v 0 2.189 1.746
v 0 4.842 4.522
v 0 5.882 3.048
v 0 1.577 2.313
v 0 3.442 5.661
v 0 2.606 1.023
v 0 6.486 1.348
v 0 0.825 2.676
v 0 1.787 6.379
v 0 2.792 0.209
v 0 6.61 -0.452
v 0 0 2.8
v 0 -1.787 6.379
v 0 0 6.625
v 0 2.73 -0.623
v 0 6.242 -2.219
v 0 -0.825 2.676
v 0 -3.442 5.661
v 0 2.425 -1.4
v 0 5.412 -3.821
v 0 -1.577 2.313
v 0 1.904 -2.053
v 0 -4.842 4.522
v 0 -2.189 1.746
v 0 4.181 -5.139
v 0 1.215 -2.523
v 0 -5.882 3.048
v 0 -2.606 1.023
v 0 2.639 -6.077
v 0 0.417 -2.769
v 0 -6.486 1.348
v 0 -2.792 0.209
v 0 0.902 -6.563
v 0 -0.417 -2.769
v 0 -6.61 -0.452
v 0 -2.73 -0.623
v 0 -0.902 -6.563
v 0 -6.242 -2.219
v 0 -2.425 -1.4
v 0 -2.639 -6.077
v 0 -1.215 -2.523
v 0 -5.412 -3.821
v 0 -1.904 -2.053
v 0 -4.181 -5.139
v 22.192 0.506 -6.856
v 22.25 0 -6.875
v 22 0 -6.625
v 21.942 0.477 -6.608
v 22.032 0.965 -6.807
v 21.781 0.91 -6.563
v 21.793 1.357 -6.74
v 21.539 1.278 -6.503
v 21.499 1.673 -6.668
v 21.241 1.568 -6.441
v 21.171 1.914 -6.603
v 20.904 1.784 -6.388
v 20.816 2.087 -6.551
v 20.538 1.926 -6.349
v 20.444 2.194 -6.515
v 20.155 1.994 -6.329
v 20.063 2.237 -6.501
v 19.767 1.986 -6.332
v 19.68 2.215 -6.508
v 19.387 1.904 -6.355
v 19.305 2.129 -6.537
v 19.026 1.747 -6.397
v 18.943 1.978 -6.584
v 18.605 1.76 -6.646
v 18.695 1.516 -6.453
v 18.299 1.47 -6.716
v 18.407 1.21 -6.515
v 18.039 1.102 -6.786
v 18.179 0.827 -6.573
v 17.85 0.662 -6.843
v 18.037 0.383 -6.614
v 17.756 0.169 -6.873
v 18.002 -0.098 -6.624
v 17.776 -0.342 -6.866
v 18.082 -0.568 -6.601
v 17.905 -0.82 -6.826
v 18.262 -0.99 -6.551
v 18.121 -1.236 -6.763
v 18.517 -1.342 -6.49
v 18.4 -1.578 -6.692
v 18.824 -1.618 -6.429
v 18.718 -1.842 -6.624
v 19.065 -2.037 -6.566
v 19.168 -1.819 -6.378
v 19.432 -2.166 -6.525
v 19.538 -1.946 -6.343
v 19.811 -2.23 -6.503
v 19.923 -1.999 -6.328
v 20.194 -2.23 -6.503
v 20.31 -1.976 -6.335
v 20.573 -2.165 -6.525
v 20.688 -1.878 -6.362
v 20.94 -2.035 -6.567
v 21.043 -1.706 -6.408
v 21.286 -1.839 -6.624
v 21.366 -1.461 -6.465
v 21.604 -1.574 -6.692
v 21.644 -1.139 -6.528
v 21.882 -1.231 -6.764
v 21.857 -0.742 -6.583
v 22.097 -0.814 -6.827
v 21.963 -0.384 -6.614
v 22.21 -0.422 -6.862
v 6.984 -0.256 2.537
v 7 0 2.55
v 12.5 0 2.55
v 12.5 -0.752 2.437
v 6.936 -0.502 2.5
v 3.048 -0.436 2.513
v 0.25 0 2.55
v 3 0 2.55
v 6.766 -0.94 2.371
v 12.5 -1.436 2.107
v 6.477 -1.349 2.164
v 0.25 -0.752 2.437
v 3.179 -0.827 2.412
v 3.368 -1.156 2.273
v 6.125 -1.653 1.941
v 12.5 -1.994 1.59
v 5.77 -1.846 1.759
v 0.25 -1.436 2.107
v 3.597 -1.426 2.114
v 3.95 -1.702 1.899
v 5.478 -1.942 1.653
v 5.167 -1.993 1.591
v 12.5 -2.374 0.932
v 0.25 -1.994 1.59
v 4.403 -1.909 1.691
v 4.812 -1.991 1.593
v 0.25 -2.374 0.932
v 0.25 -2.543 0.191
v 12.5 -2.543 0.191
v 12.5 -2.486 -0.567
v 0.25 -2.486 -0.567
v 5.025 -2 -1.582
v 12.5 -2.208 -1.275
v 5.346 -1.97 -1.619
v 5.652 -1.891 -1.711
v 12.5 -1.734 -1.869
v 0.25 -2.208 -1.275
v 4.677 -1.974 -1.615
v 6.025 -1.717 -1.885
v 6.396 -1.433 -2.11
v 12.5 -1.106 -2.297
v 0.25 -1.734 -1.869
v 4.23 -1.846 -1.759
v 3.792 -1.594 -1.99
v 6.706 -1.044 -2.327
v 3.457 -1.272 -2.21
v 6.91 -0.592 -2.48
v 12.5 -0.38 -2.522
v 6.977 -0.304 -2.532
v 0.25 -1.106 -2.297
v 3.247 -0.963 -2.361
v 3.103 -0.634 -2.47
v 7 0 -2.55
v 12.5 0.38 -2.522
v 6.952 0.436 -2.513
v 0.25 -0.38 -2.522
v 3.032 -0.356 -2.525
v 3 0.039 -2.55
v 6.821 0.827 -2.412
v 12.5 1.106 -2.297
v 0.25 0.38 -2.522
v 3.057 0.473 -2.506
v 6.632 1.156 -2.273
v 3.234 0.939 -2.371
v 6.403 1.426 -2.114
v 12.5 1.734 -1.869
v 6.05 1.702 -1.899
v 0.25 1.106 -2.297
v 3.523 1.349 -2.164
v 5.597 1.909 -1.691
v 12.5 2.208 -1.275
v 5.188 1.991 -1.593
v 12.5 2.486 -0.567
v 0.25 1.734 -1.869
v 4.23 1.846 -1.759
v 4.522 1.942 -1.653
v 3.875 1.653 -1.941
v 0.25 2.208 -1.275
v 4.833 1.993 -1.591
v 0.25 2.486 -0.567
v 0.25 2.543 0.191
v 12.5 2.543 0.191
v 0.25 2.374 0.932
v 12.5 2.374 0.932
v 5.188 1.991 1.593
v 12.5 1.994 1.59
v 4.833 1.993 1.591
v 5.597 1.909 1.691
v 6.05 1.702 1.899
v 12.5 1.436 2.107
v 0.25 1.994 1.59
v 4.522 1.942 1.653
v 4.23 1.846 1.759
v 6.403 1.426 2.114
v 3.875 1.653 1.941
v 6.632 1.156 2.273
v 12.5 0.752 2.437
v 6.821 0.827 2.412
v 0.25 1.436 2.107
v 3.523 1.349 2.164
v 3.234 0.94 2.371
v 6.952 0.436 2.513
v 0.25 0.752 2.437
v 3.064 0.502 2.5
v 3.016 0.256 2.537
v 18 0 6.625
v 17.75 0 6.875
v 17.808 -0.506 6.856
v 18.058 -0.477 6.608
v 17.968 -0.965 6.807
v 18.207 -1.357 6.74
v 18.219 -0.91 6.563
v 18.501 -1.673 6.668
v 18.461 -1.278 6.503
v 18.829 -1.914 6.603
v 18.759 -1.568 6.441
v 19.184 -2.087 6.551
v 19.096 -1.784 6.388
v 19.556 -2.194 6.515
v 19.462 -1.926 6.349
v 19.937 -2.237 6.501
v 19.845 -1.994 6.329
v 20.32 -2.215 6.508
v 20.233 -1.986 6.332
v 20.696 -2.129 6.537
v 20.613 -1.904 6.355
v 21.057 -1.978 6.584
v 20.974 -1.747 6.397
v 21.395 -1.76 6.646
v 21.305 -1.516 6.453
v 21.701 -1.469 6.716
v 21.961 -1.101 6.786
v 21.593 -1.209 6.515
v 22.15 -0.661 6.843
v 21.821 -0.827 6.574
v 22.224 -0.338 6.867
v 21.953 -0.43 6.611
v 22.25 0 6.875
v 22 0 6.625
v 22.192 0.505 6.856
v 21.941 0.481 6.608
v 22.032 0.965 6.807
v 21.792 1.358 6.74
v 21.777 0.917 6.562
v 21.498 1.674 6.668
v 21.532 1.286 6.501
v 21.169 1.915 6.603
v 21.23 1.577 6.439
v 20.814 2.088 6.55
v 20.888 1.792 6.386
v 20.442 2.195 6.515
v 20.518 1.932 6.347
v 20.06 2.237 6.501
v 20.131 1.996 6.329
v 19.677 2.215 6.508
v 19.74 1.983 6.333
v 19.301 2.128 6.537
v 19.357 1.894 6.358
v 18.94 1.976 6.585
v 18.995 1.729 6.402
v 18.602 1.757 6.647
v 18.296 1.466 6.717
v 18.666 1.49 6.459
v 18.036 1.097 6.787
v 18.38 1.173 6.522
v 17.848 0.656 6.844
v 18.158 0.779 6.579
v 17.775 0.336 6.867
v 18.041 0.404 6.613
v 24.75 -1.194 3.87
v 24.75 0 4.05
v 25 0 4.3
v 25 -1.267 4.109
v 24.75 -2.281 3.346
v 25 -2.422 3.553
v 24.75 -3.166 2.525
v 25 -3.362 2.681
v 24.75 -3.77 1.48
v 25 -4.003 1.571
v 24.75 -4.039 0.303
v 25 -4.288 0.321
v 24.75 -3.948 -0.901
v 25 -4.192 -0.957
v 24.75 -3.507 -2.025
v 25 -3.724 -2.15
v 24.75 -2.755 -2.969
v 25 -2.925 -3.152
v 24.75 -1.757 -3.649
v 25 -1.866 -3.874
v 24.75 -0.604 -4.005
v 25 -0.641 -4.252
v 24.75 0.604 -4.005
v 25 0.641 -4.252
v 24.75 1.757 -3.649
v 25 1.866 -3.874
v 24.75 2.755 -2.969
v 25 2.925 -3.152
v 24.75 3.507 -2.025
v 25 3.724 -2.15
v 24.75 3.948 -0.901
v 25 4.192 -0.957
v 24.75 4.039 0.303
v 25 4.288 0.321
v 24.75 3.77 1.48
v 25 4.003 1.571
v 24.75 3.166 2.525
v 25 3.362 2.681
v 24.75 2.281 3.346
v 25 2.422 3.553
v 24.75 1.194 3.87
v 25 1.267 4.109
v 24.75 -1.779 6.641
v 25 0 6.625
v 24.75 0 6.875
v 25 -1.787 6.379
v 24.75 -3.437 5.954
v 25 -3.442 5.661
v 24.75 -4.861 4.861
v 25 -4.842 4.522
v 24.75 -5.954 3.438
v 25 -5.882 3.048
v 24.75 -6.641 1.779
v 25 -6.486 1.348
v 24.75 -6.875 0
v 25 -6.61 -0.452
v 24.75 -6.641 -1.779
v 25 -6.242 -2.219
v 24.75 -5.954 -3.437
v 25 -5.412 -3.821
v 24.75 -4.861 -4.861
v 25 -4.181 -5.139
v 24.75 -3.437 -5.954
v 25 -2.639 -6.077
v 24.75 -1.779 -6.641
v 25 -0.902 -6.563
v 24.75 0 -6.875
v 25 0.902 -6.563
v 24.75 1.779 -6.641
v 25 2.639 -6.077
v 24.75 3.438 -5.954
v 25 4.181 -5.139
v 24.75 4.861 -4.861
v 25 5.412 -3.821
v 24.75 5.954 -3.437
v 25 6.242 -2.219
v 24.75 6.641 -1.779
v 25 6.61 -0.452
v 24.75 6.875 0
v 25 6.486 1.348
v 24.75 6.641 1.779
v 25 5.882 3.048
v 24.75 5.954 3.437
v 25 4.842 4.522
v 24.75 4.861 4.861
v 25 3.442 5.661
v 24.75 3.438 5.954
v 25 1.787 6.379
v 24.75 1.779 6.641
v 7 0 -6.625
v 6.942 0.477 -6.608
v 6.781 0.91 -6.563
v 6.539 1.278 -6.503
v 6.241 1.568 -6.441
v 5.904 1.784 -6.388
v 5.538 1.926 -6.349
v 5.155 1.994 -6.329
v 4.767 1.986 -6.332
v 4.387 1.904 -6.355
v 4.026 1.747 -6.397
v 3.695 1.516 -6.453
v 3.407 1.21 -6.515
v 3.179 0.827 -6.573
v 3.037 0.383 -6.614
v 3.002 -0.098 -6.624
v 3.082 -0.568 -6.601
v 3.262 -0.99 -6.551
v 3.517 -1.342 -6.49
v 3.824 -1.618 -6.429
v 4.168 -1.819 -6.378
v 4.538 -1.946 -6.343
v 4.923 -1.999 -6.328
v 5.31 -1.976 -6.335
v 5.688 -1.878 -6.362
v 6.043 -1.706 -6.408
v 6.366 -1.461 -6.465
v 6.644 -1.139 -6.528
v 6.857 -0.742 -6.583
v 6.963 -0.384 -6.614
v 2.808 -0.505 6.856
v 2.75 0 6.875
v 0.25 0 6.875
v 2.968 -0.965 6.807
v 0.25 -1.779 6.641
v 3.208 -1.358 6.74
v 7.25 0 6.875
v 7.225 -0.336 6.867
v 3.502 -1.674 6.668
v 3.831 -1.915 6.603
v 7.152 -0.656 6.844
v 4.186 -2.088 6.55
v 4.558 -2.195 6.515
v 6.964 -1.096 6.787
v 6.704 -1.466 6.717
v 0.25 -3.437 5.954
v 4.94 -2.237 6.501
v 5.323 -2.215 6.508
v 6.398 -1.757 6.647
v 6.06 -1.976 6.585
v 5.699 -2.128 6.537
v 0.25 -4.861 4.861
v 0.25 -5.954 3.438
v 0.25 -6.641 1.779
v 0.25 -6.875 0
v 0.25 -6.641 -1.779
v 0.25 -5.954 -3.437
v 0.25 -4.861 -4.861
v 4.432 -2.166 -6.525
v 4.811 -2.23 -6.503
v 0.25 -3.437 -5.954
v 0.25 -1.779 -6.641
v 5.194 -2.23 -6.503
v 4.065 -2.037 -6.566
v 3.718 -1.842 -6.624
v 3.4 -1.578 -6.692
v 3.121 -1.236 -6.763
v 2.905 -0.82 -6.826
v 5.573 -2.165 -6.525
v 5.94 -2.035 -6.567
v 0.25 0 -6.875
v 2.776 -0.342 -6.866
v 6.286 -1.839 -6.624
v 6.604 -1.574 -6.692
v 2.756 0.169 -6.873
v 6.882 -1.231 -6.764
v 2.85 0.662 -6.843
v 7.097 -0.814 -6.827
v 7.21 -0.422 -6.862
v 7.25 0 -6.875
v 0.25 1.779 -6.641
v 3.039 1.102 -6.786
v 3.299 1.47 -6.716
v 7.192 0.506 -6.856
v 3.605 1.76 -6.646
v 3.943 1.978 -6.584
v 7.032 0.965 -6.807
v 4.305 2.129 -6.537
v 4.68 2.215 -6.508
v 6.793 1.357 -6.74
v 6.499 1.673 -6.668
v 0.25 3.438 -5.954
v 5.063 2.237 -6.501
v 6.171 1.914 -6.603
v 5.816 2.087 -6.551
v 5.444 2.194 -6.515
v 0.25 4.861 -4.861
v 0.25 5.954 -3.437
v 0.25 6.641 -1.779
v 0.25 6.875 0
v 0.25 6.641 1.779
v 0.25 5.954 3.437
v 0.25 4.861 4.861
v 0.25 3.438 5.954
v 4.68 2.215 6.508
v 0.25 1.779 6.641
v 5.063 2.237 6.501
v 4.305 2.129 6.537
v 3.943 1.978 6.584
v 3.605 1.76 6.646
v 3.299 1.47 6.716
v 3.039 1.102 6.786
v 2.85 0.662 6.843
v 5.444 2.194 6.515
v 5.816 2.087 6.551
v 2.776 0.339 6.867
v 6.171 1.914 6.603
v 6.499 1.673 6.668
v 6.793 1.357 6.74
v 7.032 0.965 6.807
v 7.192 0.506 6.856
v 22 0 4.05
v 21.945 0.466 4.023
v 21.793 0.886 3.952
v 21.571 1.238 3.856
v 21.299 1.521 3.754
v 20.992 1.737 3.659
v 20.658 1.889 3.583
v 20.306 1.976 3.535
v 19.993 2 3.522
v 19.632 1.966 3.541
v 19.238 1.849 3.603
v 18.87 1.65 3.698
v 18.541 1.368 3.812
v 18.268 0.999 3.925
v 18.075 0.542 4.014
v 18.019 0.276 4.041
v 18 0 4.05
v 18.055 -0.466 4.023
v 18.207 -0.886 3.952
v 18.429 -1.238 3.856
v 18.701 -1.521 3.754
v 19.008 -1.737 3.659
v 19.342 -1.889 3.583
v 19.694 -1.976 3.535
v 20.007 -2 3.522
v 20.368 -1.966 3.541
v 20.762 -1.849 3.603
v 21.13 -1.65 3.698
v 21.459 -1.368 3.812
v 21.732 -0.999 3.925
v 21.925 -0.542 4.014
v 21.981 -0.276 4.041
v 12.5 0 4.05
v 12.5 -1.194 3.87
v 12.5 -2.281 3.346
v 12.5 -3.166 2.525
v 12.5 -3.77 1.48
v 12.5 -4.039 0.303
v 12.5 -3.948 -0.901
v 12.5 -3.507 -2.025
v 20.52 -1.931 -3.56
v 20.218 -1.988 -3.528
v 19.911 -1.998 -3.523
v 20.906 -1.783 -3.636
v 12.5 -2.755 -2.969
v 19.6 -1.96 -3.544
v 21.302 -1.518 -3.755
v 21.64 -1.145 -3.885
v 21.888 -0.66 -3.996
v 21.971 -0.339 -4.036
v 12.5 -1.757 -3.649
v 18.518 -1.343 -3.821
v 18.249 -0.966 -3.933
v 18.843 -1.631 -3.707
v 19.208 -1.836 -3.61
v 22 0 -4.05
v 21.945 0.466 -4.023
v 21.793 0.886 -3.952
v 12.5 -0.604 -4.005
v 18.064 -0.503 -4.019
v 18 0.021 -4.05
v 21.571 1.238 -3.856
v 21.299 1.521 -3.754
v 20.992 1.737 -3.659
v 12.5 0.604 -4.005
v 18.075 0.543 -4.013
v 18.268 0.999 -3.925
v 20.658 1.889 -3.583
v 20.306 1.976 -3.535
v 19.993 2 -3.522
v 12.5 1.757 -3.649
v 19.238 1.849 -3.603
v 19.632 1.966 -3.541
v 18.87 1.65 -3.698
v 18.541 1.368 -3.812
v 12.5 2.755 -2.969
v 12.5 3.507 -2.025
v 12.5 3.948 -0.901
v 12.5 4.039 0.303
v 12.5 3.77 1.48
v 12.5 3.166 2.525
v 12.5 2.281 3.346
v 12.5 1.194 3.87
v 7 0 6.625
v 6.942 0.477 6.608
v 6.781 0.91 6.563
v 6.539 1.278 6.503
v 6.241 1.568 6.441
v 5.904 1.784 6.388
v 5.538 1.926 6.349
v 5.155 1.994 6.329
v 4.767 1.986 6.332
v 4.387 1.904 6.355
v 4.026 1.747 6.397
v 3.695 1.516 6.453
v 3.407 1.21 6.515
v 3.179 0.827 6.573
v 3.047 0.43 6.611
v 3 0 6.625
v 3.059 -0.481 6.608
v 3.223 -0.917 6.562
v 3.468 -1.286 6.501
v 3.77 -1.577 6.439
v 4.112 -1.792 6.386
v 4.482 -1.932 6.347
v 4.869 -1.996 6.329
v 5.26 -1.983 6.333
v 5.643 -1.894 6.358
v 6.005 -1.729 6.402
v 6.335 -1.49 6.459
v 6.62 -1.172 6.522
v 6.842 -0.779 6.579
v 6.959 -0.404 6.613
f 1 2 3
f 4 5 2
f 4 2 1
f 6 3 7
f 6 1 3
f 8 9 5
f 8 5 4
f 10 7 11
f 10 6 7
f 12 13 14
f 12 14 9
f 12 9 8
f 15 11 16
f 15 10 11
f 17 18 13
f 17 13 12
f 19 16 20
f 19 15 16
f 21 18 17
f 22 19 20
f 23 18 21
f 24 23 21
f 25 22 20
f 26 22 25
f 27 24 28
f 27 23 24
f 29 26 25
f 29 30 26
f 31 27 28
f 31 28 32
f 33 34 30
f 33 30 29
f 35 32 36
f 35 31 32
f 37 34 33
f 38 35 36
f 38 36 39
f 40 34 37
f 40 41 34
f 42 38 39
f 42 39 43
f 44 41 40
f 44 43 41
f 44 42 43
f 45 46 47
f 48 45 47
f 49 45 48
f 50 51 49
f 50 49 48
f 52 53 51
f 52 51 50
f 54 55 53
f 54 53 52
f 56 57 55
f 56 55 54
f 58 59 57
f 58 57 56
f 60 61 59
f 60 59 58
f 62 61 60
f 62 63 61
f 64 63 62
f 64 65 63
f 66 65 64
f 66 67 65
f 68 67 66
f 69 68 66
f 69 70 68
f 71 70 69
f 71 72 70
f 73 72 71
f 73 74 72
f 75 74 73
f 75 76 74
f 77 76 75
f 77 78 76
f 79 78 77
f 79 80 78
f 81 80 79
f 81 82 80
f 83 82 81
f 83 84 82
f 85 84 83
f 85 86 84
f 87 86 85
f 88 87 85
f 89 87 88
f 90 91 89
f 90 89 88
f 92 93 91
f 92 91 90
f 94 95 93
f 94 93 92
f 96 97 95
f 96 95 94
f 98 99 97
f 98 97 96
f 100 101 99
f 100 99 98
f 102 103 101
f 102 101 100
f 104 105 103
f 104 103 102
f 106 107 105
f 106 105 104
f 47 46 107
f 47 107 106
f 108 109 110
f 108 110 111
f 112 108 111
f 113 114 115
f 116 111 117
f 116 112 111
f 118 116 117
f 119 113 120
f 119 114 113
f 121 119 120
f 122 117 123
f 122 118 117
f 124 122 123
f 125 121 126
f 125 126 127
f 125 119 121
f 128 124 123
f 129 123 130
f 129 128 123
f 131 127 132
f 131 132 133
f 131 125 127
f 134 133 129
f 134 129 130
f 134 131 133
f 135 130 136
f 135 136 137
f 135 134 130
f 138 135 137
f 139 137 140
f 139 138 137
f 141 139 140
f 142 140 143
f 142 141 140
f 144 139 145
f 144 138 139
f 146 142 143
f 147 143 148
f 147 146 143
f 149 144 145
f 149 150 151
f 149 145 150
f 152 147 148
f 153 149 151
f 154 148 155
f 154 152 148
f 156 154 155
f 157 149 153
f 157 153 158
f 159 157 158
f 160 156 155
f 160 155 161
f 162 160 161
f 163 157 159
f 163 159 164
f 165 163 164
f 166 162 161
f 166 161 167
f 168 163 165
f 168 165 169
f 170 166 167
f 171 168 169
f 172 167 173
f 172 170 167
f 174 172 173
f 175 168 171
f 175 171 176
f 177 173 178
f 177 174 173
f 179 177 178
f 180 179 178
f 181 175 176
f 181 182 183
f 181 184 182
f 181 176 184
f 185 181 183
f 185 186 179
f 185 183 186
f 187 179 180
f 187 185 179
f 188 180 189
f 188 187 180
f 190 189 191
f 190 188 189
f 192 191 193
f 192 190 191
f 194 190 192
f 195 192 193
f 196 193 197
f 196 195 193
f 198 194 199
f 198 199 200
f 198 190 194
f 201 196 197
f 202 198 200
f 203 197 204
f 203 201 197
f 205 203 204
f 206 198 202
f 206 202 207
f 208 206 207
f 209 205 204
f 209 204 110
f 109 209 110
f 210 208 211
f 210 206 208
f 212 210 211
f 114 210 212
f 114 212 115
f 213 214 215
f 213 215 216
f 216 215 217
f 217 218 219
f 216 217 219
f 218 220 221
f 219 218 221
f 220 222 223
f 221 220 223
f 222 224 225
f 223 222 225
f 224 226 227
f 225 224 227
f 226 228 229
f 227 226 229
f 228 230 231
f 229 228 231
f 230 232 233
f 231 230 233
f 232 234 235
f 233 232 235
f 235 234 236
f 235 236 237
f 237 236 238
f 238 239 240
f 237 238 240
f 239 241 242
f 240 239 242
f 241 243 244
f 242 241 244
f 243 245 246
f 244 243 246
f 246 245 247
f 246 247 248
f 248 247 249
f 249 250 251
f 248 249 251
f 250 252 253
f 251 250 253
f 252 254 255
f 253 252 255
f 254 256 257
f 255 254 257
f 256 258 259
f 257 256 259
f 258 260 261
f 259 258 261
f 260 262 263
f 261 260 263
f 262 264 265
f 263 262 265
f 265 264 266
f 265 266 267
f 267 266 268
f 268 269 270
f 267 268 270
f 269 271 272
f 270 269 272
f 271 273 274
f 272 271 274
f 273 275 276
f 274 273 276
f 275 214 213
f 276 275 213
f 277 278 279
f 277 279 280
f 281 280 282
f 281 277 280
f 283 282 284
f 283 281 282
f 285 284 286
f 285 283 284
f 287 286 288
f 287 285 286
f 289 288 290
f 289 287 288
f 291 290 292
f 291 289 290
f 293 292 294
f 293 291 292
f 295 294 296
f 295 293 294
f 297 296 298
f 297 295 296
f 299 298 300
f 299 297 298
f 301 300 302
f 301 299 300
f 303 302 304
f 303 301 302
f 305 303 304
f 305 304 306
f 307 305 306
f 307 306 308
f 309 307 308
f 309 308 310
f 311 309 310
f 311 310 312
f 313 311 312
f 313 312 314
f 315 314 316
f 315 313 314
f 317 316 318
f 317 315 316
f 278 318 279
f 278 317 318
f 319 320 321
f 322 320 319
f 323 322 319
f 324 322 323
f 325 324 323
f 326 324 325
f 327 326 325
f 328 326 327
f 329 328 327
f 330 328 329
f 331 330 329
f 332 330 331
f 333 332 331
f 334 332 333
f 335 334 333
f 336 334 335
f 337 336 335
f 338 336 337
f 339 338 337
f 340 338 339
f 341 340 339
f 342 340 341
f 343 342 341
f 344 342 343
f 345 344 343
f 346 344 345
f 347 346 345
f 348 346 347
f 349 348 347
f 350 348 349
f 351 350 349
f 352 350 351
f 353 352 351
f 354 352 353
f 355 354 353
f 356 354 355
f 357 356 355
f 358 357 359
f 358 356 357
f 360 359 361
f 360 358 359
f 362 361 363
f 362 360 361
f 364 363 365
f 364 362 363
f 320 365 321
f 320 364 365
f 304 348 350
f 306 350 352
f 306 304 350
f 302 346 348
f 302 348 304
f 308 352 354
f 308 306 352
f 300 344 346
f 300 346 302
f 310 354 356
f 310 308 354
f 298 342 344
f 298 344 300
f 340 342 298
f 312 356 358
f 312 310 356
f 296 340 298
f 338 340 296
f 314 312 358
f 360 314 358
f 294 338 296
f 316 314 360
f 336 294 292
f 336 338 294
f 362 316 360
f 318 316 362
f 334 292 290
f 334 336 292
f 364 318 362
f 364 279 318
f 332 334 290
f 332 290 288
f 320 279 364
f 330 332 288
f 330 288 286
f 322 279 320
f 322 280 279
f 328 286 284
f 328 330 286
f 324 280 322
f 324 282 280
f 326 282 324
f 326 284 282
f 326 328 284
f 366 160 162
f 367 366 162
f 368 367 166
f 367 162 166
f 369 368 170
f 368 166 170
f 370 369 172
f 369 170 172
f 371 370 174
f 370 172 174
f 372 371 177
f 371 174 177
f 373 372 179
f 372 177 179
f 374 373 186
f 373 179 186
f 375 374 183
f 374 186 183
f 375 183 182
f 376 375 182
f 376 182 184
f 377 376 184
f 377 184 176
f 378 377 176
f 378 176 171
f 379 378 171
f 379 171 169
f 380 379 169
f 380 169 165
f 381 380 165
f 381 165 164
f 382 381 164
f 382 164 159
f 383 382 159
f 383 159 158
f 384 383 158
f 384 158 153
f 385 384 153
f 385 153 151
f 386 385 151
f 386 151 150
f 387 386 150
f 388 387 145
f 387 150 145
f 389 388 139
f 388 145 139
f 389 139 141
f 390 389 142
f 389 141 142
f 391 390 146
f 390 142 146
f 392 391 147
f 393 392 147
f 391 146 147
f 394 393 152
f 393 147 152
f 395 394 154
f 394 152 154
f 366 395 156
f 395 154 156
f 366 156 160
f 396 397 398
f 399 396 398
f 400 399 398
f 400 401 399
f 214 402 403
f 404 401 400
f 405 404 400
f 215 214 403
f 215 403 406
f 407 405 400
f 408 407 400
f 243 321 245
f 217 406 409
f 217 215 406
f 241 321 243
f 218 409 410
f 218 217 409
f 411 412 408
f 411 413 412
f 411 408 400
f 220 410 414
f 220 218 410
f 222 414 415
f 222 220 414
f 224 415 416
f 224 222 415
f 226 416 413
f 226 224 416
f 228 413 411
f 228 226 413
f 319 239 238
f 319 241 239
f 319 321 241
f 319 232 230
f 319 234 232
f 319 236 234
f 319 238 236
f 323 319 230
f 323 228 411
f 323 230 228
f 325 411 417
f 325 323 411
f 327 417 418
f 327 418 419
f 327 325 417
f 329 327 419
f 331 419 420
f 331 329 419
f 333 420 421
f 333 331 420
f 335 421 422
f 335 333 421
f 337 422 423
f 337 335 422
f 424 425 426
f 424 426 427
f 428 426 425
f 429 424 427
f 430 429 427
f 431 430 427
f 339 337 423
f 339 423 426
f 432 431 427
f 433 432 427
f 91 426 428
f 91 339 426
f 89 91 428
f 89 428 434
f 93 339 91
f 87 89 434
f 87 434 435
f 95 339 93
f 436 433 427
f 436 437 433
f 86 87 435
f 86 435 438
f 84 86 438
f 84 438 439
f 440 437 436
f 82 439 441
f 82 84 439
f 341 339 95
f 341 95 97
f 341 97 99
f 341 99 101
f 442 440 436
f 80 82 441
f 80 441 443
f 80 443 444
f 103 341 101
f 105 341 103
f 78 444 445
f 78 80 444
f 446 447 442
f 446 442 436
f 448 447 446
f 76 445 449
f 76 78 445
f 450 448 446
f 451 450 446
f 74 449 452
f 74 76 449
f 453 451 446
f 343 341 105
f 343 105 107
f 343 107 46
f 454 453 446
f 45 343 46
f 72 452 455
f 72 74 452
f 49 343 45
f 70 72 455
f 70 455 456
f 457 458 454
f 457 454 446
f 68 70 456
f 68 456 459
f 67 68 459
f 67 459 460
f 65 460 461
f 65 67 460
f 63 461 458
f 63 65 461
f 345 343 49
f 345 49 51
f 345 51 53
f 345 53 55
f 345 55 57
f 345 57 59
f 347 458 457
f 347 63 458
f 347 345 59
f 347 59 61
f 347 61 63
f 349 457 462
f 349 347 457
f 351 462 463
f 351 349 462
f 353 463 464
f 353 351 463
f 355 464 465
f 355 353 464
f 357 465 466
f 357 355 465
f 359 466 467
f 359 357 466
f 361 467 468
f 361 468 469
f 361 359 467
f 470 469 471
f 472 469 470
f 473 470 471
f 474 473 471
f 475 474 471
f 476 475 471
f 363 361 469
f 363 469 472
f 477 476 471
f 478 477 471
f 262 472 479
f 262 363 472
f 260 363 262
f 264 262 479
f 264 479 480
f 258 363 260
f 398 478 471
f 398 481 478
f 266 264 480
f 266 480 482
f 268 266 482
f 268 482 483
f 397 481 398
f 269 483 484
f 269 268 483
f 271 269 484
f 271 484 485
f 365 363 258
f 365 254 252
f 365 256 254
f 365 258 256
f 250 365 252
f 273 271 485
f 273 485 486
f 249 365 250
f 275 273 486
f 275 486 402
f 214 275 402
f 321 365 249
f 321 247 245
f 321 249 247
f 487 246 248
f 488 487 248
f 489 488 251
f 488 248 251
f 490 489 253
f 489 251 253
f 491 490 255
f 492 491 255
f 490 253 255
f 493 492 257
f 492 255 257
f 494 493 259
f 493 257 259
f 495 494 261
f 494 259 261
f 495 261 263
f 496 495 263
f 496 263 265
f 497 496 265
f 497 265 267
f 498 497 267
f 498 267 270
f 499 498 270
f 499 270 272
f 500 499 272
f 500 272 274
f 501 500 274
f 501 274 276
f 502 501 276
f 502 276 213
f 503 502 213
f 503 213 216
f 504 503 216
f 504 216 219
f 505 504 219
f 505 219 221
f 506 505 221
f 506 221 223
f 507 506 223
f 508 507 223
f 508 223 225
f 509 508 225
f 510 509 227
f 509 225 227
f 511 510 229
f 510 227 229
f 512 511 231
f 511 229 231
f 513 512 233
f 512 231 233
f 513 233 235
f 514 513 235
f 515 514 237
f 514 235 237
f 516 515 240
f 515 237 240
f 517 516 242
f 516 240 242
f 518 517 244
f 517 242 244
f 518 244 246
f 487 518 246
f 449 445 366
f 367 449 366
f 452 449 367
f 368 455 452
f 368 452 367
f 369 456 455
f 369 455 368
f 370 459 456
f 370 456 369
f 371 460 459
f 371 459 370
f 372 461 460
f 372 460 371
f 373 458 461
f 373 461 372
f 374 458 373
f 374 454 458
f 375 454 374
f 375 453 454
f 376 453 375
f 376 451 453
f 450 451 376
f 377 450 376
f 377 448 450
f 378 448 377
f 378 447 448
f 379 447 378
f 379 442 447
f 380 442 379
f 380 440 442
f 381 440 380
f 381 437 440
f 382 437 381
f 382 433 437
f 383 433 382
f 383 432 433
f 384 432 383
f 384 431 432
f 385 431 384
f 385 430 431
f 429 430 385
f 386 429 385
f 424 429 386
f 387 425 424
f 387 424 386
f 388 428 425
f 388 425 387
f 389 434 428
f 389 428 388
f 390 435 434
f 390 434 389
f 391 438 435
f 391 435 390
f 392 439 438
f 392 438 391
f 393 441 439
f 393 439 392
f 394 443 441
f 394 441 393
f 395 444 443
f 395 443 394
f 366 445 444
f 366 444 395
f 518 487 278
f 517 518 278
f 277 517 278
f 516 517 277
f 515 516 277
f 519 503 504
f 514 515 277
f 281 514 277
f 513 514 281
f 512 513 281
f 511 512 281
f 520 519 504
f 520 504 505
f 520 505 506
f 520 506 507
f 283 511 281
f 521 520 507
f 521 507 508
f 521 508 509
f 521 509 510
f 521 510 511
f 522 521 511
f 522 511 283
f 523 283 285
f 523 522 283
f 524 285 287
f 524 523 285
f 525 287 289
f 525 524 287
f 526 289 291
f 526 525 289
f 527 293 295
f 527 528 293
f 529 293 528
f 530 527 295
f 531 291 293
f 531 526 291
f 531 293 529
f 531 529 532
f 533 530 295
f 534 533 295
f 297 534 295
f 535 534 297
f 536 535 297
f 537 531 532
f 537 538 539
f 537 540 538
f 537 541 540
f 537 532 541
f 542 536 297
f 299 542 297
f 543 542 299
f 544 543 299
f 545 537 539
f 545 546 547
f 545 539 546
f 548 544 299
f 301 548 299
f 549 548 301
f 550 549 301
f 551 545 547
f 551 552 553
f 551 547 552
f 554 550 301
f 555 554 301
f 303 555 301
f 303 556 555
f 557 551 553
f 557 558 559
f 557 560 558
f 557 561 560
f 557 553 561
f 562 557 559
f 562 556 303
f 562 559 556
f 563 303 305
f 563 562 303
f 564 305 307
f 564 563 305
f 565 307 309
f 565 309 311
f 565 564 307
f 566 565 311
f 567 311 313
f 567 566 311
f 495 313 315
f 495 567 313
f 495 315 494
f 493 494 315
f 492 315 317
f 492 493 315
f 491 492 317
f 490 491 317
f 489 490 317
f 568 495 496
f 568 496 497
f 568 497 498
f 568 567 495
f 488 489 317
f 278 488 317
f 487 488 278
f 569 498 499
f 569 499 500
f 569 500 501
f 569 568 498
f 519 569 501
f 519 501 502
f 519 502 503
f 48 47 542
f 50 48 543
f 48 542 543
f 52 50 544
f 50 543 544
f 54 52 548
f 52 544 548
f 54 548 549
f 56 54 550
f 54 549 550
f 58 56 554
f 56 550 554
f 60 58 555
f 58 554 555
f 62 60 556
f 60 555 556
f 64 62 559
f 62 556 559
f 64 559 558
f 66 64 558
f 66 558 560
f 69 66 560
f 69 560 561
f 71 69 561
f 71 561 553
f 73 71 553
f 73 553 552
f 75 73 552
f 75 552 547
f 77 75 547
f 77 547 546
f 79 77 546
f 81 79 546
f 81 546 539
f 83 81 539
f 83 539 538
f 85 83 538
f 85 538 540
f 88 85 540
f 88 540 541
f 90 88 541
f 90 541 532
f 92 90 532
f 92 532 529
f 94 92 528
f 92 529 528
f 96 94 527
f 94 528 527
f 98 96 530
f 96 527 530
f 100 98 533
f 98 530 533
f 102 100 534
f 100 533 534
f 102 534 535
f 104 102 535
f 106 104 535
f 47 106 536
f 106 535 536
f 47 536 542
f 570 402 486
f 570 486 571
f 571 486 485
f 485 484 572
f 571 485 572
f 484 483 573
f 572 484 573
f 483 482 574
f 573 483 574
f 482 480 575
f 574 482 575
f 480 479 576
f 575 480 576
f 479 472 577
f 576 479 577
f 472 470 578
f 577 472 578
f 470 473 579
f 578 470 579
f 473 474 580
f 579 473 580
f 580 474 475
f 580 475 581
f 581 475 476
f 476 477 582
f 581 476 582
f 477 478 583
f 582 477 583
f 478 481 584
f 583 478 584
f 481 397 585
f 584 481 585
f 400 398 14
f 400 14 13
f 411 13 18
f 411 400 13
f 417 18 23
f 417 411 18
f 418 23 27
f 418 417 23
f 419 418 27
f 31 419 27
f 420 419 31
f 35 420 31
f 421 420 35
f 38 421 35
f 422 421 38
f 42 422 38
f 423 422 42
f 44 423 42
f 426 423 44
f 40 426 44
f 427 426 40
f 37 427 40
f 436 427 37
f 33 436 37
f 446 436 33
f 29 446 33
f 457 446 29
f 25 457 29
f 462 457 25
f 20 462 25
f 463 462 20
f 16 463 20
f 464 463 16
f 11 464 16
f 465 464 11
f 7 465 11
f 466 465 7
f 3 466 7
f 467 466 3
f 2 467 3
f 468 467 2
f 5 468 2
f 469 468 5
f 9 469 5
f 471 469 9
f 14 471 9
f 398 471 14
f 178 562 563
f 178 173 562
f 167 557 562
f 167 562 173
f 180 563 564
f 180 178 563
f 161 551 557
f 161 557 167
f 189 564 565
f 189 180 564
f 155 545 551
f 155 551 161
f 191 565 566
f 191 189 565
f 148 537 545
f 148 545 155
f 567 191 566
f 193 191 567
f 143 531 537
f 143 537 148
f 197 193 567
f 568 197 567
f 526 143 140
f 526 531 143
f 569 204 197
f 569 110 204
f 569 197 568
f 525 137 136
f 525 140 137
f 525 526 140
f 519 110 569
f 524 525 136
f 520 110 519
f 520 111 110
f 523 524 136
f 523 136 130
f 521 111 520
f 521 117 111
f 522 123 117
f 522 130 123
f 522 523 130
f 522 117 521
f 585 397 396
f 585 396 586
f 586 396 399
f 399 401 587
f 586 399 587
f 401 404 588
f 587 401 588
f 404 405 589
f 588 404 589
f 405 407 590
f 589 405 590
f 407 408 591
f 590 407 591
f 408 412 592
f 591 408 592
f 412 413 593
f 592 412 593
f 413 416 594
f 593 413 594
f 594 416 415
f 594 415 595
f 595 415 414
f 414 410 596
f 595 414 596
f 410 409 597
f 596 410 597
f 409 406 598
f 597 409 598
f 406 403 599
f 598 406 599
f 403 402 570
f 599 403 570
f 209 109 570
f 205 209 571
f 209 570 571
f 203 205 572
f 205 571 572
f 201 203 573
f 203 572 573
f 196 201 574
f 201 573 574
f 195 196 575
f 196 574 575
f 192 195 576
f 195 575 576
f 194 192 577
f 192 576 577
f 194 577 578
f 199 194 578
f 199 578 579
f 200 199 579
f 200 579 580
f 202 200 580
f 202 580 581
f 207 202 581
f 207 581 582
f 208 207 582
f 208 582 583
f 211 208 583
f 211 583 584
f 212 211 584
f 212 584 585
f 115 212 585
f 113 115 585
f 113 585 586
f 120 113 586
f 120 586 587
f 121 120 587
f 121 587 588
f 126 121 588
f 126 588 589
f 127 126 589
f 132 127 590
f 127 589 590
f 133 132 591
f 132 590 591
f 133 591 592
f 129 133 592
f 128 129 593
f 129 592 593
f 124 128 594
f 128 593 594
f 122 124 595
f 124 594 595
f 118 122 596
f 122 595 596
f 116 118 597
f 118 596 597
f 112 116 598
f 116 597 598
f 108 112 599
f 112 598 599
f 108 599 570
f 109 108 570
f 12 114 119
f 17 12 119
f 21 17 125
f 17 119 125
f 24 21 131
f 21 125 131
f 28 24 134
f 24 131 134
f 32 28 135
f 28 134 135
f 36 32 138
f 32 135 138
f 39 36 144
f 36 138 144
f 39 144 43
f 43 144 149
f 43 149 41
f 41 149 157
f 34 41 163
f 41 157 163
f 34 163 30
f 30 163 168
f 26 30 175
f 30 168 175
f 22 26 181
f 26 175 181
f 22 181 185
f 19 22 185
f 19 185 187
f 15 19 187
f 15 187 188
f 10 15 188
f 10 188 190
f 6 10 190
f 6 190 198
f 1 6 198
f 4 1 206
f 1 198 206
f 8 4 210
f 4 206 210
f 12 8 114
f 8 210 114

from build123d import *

# Parameters (mm, degrees)
SKETCH001_R  = 2
HOLE_DEPTH   = 20.626
CHAMFER_SIZE = 0.25


with BuildPart() as part:
    # Sketch → Revolution (revolve)
    with BuildSketch(Plane.XZ):
        Polygon((0, 2.55), (0, 6.875), (25, 6.875), (25, 4.05), (12.5, 4.05), (12.5, 2.55), align=None)
    revolve(axis=Axis((0, 0, 0), (1, 0, 0)))

    # Sketch001 → Hole (cut, through all)
    with BuildSketch(Plane.XY.offset(13.75)):
        with Locations((5, 0)):
            Circle(SKETCH001_R)
        with Locations((20, 0)):
            Circle(SKETCH001_R)
    extrude(amount=-HOLE_DEPTH, mode=Mode.SUBTRACT)

    # Chamfer
    chamfer_edges = [part.edges().sort_by_distance(p)[0] for p in [
        (25, 0, -6.875),
        (0, 0, -6.875),
        (25, 0, -4.05),
        (0, 0, -2.55),
        (5, 2, 6.577661),
        (5, -2, 6.577661),
        (20, -2, 6.577661),
        (20, 2, 6.577661),
        (3, 0, -6.875),
        (18, 0, -6.875),
    ]]
    chamfer(chamfer_edges, length=CHAMFER_SIZE)


solid = part.part
